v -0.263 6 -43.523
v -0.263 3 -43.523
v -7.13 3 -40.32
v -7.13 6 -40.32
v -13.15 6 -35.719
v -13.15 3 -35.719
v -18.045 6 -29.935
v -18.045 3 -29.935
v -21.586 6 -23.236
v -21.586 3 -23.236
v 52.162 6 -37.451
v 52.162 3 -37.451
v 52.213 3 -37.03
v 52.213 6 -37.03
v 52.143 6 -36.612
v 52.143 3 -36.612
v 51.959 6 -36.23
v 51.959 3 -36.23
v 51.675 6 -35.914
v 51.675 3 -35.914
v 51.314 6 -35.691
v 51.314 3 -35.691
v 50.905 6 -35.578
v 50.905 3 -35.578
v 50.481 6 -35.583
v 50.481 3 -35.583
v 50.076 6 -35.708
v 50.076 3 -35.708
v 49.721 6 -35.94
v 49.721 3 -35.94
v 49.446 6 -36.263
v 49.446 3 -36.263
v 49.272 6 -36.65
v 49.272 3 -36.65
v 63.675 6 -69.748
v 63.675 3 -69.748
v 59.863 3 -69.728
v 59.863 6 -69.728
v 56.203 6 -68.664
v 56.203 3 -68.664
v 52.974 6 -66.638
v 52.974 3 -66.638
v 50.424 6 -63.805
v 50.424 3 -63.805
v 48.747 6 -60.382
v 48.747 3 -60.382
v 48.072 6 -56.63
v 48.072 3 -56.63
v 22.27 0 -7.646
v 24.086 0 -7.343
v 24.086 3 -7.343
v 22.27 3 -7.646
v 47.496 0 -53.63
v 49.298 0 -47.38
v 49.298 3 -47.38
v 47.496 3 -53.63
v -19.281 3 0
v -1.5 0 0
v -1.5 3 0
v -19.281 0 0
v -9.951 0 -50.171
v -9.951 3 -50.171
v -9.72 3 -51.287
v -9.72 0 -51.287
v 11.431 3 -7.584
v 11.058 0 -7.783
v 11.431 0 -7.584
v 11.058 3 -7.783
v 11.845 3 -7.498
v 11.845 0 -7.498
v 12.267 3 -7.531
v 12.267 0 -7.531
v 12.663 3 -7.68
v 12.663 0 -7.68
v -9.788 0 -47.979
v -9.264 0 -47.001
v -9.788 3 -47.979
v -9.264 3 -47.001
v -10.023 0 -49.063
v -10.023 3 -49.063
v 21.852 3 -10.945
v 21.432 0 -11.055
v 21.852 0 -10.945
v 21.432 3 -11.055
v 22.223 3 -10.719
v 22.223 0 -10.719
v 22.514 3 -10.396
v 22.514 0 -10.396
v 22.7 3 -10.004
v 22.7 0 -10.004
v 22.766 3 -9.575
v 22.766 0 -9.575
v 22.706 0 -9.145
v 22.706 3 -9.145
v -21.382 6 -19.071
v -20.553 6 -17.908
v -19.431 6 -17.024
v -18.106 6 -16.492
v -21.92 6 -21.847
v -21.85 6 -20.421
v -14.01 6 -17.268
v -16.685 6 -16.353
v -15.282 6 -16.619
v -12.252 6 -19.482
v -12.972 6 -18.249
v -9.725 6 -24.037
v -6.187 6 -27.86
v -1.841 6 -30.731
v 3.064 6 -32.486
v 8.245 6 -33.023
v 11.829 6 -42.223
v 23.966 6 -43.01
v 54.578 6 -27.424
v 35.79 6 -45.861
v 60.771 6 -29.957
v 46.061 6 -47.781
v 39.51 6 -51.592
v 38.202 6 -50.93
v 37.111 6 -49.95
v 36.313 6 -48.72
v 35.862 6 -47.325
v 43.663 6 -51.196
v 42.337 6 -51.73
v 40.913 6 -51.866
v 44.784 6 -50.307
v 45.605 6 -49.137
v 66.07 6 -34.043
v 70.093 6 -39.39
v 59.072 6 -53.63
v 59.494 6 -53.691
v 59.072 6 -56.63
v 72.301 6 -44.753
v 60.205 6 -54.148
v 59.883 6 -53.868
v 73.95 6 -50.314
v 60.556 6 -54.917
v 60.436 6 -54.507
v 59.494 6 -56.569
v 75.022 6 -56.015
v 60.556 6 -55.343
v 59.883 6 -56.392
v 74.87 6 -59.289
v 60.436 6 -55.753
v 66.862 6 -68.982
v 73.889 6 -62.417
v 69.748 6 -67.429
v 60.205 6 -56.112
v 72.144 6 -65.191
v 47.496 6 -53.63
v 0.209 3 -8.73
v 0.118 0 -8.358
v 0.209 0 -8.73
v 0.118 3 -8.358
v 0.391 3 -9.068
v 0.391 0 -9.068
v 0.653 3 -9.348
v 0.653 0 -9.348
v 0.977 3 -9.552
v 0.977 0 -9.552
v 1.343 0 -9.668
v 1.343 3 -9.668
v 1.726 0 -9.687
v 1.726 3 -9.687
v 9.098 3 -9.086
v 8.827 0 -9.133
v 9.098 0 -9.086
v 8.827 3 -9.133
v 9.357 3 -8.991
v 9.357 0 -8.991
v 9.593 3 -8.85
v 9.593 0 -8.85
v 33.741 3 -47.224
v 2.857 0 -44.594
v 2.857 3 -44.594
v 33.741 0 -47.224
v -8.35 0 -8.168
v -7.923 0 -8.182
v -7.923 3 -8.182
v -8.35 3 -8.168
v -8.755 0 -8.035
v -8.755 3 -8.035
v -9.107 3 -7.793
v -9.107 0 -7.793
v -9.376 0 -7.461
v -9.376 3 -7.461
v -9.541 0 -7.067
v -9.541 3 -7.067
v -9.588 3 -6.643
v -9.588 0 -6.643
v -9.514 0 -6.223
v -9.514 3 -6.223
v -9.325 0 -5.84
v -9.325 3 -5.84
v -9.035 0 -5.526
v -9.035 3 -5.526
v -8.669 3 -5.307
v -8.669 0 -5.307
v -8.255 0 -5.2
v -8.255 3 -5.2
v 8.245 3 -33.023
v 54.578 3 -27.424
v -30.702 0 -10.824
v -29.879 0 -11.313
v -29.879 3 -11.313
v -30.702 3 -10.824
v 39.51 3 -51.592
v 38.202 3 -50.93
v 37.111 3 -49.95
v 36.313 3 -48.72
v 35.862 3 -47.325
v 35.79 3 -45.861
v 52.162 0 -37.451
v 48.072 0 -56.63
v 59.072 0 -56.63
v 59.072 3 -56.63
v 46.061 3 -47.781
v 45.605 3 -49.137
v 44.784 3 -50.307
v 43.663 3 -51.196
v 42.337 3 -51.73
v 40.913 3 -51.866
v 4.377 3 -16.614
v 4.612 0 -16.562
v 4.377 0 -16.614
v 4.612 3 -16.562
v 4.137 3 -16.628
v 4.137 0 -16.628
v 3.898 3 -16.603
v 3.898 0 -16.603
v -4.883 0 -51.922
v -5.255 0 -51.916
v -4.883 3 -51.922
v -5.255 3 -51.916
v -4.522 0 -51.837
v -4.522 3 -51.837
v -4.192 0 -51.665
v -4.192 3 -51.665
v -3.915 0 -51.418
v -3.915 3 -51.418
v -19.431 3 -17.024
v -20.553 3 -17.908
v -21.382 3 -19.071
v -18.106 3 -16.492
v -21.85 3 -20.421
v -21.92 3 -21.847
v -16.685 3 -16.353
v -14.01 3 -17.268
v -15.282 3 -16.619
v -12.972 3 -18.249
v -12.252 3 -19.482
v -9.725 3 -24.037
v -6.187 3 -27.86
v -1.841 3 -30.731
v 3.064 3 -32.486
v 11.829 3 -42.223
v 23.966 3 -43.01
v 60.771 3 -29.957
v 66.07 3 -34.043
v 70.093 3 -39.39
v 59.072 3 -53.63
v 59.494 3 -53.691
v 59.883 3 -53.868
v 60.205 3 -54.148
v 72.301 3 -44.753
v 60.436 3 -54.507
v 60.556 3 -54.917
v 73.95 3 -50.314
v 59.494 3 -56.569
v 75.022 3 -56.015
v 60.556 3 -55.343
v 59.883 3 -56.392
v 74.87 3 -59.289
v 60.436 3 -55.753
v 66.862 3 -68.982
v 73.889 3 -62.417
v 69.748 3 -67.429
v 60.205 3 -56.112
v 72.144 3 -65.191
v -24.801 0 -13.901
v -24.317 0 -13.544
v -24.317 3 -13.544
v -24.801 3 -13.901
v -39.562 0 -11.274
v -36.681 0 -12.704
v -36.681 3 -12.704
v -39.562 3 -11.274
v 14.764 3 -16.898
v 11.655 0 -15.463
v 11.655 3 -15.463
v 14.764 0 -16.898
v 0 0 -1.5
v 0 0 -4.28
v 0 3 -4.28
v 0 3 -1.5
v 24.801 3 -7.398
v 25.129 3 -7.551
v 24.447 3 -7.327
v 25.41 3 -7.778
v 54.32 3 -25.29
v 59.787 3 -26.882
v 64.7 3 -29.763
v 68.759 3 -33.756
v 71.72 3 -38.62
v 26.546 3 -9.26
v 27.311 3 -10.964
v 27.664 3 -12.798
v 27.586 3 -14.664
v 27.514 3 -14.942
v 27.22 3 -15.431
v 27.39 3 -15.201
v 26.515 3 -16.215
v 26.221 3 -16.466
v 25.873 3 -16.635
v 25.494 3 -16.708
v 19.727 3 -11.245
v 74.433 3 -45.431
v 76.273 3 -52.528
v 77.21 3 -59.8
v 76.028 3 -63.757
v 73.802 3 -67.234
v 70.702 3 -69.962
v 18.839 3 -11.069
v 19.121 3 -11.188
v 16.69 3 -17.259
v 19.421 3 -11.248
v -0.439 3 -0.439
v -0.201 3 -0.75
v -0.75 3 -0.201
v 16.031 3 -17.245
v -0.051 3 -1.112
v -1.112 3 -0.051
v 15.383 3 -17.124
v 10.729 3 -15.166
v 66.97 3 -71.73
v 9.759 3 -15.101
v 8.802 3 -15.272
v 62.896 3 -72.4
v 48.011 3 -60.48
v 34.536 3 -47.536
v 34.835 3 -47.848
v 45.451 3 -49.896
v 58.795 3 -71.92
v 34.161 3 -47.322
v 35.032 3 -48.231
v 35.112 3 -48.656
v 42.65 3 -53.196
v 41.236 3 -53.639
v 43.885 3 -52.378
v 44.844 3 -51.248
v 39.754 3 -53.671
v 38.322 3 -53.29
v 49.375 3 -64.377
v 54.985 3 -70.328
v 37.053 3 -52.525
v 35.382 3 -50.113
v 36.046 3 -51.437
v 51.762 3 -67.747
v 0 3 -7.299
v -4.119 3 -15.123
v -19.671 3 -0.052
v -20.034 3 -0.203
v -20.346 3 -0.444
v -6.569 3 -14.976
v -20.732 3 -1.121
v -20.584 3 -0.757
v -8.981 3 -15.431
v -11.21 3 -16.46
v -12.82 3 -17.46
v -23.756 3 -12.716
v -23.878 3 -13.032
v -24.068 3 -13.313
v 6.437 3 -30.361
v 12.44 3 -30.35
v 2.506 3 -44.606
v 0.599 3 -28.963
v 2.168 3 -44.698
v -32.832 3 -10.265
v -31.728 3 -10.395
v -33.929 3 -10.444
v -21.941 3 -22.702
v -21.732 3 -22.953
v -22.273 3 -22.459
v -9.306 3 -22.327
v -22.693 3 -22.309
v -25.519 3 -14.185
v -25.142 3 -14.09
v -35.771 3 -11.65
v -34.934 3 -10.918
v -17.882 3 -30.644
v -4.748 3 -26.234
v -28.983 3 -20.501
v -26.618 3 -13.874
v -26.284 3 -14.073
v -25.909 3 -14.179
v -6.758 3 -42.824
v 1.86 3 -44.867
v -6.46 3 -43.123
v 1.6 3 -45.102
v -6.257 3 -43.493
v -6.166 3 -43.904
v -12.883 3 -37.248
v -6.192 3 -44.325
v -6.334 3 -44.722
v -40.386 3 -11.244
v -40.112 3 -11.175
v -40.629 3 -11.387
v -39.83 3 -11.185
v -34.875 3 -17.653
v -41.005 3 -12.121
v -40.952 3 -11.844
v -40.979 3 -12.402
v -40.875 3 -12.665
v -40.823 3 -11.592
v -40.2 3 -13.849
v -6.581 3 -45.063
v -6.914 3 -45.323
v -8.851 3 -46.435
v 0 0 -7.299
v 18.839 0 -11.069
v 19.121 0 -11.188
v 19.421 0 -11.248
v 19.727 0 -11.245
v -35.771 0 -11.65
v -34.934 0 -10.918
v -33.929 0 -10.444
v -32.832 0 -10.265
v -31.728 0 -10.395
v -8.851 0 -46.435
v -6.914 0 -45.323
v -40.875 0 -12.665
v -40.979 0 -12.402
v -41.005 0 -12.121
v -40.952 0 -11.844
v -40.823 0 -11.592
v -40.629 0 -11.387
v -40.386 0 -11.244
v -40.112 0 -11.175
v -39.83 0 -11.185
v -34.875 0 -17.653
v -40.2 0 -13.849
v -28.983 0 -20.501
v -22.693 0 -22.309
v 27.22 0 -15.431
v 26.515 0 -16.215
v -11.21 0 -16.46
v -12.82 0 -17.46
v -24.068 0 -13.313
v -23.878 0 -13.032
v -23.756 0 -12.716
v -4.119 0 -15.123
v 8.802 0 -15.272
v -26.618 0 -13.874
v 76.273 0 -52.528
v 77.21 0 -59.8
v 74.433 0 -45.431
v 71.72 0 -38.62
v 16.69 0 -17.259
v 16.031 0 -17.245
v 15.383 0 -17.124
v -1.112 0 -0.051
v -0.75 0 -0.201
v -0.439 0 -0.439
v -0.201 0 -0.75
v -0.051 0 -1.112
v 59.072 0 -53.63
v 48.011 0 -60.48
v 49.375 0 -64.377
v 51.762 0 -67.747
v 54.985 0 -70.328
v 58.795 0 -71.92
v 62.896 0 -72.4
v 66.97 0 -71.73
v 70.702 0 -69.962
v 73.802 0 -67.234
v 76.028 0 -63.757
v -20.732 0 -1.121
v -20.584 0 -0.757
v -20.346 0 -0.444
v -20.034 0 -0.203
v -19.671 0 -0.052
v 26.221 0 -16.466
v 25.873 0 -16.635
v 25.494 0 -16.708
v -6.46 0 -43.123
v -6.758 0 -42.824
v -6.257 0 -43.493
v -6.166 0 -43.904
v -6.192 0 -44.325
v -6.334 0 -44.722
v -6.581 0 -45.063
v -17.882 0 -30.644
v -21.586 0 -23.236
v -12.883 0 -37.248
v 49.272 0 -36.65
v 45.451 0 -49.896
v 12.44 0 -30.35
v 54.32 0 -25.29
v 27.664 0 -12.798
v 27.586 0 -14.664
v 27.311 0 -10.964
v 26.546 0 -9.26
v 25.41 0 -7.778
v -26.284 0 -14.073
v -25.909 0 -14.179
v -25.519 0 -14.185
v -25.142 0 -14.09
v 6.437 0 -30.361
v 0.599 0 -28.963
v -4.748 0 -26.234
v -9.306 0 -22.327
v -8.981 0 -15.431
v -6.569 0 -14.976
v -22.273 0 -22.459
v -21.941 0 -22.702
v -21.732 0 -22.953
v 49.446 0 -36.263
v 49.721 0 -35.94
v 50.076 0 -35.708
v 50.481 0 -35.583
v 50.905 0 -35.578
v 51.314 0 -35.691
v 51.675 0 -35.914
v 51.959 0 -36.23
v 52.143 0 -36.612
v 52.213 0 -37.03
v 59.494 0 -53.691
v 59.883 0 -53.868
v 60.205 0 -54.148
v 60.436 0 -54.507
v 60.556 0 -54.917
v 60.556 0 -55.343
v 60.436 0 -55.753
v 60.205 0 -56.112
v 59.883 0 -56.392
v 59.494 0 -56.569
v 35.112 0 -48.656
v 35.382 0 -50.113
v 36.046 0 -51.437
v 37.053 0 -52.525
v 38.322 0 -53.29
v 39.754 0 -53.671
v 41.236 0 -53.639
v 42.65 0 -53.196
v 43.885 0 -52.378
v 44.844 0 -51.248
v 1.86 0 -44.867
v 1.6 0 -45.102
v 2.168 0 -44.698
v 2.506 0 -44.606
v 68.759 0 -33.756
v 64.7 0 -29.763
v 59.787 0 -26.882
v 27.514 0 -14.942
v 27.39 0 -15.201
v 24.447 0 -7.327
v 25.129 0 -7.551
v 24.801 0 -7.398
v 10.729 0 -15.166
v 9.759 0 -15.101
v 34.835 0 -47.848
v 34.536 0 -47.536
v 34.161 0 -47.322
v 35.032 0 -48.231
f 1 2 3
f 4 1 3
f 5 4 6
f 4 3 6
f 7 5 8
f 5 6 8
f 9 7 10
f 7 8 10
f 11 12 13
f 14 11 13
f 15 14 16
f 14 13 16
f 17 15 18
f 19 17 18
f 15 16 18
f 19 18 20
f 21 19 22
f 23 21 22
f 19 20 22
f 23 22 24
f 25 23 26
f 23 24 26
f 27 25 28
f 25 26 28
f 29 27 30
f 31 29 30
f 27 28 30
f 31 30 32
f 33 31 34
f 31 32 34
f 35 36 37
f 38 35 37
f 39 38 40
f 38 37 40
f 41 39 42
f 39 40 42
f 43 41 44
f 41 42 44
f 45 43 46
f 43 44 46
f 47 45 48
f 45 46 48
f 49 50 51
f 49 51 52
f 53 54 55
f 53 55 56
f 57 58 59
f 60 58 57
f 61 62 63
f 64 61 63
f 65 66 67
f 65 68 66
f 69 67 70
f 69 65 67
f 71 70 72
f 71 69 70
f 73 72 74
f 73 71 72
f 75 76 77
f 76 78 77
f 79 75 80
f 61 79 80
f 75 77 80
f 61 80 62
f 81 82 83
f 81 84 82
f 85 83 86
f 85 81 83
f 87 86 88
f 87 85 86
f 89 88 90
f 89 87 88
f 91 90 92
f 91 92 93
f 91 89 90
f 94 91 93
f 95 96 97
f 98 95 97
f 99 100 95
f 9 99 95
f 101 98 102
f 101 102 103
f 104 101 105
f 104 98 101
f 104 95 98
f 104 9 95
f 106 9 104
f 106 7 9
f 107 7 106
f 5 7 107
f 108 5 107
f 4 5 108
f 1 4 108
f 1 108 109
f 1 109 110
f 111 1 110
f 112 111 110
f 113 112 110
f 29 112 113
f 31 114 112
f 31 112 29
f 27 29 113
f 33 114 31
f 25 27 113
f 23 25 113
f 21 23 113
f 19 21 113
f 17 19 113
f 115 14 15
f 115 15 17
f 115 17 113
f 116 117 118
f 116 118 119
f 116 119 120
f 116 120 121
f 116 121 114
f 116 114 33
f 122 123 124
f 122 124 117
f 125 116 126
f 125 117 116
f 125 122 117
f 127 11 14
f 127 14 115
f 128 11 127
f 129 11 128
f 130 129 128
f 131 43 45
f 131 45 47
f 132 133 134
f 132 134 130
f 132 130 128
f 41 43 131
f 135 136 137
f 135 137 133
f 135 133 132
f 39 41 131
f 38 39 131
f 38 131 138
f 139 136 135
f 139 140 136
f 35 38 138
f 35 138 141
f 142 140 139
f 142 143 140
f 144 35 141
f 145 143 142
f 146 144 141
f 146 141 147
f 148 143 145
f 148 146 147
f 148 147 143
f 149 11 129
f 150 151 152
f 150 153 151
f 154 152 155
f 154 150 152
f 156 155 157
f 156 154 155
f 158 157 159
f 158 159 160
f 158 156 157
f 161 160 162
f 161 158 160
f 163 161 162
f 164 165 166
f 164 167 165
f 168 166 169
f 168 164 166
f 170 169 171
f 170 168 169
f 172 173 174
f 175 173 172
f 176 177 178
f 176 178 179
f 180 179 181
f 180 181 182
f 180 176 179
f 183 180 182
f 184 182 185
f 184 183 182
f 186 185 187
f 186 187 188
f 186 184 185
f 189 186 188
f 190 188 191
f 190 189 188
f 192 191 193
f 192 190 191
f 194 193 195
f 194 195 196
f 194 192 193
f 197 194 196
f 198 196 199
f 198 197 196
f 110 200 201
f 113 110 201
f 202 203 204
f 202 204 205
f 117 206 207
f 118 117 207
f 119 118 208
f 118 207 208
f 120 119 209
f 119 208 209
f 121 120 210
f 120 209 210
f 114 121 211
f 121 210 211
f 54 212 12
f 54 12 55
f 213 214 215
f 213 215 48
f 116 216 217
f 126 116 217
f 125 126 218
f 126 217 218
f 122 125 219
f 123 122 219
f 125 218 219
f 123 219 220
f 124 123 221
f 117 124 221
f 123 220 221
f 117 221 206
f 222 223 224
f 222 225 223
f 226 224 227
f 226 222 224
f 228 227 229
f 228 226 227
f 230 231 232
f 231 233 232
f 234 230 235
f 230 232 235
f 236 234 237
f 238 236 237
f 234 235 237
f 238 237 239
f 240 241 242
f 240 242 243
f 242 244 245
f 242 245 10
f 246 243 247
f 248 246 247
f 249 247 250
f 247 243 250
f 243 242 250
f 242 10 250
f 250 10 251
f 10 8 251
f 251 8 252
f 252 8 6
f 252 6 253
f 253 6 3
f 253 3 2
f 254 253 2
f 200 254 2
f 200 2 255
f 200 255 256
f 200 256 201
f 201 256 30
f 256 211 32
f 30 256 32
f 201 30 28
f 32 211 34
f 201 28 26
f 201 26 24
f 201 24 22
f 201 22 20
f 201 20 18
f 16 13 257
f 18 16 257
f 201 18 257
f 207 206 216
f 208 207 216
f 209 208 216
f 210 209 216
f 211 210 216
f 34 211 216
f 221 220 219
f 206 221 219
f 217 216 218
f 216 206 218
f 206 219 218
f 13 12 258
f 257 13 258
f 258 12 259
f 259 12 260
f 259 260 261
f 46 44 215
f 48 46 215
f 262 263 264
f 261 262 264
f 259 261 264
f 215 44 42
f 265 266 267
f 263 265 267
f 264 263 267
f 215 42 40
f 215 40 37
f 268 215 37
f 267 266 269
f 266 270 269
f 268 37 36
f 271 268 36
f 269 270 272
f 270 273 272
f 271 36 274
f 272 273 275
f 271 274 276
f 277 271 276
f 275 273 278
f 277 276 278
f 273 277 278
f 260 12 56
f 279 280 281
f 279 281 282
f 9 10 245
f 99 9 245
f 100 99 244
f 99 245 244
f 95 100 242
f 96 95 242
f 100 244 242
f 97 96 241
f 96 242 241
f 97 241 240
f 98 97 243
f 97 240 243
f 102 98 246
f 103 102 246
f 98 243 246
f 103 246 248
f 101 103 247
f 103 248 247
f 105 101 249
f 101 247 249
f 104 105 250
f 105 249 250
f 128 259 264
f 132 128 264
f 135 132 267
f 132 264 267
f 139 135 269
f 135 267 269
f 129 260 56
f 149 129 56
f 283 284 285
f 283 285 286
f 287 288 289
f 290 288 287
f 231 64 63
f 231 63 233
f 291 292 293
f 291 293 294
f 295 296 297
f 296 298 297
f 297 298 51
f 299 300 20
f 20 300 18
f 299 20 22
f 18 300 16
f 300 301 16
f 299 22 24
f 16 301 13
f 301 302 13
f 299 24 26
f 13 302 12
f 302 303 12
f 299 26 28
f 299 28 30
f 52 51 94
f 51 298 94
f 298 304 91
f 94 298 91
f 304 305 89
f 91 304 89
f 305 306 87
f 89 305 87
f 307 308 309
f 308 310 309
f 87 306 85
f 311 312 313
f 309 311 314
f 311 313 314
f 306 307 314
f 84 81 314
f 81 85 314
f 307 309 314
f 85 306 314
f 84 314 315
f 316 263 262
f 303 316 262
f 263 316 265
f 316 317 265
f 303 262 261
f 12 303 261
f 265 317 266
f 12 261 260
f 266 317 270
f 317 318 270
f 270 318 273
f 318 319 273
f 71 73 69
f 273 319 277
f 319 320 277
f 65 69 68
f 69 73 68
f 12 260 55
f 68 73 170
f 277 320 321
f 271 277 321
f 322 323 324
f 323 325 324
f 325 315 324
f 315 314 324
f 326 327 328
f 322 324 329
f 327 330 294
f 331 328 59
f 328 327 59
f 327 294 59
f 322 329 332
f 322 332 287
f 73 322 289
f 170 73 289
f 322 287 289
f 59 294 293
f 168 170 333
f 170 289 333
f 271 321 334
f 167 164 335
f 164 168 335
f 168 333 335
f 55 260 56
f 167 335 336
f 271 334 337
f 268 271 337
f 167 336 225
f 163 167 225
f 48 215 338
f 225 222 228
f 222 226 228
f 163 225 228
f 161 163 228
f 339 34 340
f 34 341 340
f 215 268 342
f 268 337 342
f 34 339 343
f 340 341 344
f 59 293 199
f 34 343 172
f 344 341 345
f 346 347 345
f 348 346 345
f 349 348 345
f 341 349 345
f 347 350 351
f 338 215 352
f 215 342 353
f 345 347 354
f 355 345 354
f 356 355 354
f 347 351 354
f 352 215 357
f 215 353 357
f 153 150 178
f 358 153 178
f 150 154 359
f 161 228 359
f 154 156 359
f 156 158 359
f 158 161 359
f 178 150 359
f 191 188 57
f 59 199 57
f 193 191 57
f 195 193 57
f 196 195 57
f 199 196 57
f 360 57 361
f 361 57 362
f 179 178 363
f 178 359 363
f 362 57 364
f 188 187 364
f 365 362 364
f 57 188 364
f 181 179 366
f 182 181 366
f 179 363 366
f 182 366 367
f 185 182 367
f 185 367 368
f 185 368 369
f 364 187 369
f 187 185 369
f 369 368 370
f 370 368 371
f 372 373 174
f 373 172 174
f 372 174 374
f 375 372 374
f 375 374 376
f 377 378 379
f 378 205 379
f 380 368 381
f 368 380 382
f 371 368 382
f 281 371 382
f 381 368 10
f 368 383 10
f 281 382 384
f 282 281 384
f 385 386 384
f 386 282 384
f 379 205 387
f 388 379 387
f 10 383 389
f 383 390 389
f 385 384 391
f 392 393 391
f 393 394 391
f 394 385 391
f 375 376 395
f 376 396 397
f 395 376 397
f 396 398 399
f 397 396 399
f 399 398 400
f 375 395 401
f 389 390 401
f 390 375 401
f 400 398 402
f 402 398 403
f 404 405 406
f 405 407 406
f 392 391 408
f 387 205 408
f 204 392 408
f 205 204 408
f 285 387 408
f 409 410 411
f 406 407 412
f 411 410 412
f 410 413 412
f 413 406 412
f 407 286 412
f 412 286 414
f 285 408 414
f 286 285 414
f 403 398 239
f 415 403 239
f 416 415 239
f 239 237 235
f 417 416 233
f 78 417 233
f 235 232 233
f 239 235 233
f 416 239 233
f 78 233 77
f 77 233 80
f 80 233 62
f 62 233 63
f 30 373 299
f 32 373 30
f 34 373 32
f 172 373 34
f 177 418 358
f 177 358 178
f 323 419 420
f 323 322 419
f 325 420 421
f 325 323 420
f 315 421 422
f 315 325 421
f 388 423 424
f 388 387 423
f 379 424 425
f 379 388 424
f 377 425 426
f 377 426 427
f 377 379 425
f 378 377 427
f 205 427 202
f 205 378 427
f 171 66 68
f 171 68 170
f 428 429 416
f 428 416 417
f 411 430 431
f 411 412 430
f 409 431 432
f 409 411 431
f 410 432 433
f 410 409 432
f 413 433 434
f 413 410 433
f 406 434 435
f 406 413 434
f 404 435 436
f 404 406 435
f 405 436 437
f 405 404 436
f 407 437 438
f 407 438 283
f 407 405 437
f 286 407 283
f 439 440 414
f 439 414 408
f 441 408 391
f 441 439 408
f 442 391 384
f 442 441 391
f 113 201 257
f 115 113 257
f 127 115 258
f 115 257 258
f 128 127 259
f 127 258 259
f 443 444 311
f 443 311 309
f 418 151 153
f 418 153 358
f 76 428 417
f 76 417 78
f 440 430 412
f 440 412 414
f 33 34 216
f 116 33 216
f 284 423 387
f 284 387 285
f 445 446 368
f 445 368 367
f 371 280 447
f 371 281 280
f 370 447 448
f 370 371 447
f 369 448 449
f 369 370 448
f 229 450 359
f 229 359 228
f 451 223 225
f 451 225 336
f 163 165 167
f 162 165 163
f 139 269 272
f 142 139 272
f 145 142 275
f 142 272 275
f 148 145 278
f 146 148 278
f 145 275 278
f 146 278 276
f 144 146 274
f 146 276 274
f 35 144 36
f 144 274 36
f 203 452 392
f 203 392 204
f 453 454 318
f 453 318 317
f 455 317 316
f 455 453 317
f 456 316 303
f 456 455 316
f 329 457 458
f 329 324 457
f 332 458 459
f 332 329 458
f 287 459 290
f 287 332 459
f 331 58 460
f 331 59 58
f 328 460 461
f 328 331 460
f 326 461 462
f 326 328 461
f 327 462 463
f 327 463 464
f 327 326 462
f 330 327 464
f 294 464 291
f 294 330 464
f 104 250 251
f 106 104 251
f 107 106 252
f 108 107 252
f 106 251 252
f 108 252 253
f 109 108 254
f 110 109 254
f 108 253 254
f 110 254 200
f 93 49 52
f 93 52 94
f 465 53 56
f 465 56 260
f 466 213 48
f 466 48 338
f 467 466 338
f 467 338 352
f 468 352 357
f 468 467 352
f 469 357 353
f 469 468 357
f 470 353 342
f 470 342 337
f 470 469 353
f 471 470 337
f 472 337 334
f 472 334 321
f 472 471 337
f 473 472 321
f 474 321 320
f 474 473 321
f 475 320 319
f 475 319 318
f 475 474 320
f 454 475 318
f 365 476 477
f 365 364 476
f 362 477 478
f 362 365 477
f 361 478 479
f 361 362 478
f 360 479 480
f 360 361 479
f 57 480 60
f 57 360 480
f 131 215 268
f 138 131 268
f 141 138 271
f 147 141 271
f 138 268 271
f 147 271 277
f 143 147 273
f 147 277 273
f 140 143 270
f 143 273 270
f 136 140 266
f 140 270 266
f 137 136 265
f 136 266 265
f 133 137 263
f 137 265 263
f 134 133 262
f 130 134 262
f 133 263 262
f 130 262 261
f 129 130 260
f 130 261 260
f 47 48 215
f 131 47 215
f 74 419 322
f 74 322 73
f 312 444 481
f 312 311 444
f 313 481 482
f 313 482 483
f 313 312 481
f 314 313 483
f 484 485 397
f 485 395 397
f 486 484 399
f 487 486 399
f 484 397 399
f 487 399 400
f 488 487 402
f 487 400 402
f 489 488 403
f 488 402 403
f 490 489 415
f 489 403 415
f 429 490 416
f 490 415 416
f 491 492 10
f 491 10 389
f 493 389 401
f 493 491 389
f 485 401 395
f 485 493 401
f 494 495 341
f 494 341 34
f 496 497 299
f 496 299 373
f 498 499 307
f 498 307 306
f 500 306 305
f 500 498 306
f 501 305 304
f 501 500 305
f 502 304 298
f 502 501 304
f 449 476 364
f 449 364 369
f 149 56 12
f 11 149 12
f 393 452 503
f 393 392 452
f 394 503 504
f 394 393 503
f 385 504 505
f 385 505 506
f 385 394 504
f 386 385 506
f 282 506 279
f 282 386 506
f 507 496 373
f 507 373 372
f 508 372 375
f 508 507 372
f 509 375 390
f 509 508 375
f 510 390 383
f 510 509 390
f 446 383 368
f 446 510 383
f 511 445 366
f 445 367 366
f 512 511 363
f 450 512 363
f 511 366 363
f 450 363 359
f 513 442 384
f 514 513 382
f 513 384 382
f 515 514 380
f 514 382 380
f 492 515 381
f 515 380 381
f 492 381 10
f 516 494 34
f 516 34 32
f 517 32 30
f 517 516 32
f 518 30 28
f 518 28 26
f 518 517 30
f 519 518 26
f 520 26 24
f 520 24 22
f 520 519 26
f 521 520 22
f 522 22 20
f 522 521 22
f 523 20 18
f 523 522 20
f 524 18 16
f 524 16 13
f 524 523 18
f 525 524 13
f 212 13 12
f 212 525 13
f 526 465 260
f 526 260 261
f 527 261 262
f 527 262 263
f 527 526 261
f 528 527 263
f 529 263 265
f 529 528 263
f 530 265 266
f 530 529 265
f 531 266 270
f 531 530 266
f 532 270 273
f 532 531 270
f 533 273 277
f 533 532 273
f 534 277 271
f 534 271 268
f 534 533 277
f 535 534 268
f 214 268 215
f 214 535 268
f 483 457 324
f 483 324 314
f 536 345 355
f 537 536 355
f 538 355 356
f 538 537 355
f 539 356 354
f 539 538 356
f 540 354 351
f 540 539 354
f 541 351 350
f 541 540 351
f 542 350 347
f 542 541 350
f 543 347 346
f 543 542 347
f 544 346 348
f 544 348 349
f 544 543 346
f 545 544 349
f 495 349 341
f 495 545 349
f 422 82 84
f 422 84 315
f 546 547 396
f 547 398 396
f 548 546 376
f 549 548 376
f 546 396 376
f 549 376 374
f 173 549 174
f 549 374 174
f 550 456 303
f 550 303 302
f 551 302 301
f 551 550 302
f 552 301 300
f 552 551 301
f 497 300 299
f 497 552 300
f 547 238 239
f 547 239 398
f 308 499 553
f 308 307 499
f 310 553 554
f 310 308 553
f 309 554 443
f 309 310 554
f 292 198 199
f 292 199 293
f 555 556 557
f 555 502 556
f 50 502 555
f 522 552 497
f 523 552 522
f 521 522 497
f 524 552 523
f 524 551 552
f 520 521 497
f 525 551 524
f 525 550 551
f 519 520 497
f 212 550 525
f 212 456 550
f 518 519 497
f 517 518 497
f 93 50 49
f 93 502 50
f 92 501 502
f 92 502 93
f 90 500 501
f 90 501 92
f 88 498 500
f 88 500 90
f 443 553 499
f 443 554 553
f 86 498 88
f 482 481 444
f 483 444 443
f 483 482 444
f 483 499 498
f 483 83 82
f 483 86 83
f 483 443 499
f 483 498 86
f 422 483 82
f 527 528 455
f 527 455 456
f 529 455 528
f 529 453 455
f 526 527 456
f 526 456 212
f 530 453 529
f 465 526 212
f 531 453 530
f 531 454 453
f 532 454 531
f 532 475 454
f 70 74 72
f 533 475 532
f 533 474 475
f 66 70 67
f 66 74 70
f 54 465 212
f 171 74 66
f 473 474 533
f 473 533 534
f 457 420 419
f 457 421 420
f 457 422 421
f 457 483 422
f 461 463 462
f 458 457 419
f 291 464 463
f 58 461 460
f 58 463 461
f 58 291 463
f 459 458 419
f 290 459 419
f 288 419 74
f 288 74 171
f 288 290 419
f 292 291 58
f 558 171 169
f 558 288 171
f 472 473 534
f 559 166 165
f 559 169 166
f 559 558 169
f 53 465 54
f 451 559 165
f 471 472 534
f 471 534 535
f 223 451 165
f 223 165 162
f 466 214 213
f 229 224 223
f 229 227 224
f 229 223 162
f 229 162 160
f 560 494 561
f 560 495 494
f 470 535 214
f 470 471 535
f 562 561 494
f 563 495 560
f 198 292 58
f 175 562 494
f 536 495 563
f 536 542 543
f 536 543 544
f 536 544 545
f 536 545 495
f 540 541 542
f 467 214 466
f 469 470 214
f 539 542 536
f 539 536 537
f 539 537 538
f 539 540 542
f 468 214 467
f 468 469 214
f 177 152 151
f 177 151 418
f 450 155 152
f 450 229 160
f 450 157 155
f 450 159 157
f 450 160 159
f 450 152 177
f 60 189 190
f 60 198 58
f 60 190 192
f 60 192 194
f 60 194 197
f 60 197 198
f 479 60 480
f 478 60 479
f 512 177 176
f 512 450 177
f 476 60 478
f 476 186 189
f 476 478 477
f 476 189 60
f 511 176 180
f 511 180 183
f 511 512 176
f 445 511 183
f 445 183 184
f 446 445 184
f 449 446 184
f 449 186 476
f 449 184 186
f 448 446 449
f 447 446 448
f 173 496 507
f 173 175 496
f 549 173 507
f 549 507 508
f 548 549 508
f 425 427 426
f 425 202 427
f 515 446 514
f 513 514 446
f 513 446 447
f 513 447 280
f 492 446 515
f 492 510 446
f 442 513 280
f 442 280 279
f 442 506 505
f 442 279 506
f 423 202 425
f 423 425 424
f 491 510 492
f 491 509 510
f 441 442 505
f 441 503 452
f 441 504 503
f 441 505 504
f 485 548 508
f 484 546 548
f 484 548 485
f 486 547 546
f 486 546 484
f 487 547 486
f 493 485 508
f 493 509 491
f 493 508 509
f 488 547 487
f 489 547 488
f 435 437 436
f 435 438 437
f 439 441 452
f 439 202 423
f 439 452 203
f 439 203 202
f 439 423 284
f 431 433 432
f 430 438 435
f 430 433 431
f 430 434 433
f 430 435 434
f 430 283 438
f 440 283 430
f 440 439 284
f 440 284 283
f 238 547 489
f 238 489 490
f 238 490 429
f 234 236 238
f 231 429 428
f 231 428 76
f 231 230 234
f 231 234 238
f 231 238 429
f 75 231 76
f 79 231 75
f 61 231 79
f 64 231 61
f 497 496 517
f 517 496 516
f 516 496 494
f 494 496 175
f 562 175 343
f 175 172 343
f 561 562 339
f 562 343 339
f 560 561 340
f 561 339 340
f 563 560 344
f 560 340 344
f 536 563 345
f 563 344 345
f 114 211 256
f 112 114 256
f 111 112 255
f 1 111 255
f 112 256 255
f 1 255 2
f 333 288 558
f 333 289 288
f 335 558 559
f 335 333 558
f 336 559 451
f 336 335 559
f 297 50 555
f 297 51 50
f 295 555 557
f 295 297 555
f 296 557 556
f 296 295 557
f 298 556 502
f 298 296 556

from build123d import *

# Parameters (mm, degrees)
BOSS_EXTRUDE1_DEPTH = 3
FILLET1_R           = 10
FILLET2_R           = 1
FILLET3_R           = 1.5
FILLET4_R           = 4
FILLET5_R           = 4
BOSS_EXTRUDE2_DEPTH = 3


with BuildPart() as part:
    # Sketch2 → Boss-Extrude1 (new body)
    with BuildSketch(Plane(origin=(0, 0, 0), x_dir=(1, 0, 0), z_dir=(0, 1, 0))):
        with BuildLine():
            Line((-42.5, 9.815250458), (-40.2, 13.848552856))
            ThreePointArc((-40.2, 13.848552856), (-31.616402931, 19.380516515), (-21.88, 22.46))
            ThreePointArc((-21.88, 22.46), (-15.087159026, 34.642704233), (-4.89, 44.16))
            Line((-4.89, 44.16), (-8.851038754, 46.435359195))
            Line((-8.851038754, 46.435359195), (-10.31, 48.433697347))
            Line((-10.31, 48.433697347), (-9.719569356, 51.28656851))
            Line((-9.719569356, 51.28656851), (-4.45, 52.03))
            Line((-4.45, 52.03), (2.1, 44.53))
            Line((2.1, 44.53), (35.22, 47.35))
            ThreePointArc((35.22, 47.35), (39.1087714, 53.552611798), (45.450837647, 49.895682508))
            Line((45.450837647, 49.895682508), (49.271682555, 36.649721013))
            ThreePointArc((49.271682555, 36.649721013), (51.113757972, 35.62), (52.162431436, 37.451352279))
            Line((52.162431436, 37.451352279), (49.298477535, 47.38))
            Line((49.298477535, 47.38), (47.49564271, 53.63))
            Line((47.49564271, 53.63), (59.07164271, 53.63))
            ThreePointArc((59.07164271, 53.63), (60.57164271, 55.13), (59.07164271, 56.63))
            Line((59.07164271, 56.63), (48.07164271, 56.63))
            Line((48.07164271, 56.63), (48.010812194, 60.48))
            ThreePointArc((48.010812194, 60.48), (62.895920888, 72.4), (77.21, 59.8))
            ThreePointArc((77.21, 59.8), (75.464062366, 48.951036242), (71.72, 38.62))
            ThreePointArc((71.72, 38.62), (64.699564013, 29.762620869), (54.32, 25.29))
            Line((54.32, 25.29), (12.44, 30.35))
            ThreePointArc((12.44, 30.35), (-2.155765073, 27.757228529), (-12.82, 17.46))
            Line((-12.82, 17.46), (-7.923093172, 14.42))
            Line((-7.923093172, 14.42), (4.26, 16.67))
            Line((4.26, 16.67), (10.264967392, 14.82186735))
            Line((10.264967392, 14.82186735), (15.68118928, 17.321714129))
            Line((15.68118928, 17.321714129), (26.105067381, 16.67))
            Line((26.105067381, 16.67), (27.5, 15.12))
            ThreePointArc((27.5, 15.12), (27.256062178, 10.796585791), (24.812537217, 7.22158903))
            Line((24.812537217, 7.22158903), (22.269740859, 7.646334739))
            Line((22.269740859, 7.646334739), (23.205269456, 10.857431213))
            Line((23.205269456, 10.857431213), (19.255161489, 11.297641869))
            Line((19.255161489, 11.297641869), (11.827625236, 7.22158903))
            Line((11.827625236, 7.22158903), (9.25, 9.1))
            Line((9.25, 9.1), (0.278765895, 9.8))
            Line((0.278765895, 9.8), (0, 7.298571725))
            Line((0, 7.298571725), (-7.923093172, 8.181542538))
            ThreePointArc((-7.923093172, 8.181542538), (-9.58, 6.856906829), (-8.255364291, 5.2))
            Line((-8.255364291, 5.2), (0, 4.28))
            Line((0, 4.28), (0, 0))
            Line((0, 0), (-20.44, 0))
            Line((-20.44, 0), (-23.89, 13.229016126))
            Line((-23.89, 13.229016126), (-25.72, 14.58))
            Line((-25.72, 14.58), (-29.87882635, 11.312892327))
            Line((-29.87882635, 11.312892327), (-33.582044966, 9.115250458))
            Line((-33.582044966, 9.115250458), (-36.680656461, 12.703691255))
            Line((-36.680656461, 12.703691255), (-42.5, 9.815250458))
        make_face()
    extrude(amount=BOSS_EXTRUDE1_DEPTH)

    # Fillet1
    fillet1_edges = [part.edges().sort_by_distance(p)[0] for p in [
        (-7.923093172, 1.5, -14.42),
    ]]
    fillet(fillet1_edges, radius=FILLET1_R)

    # Fillet2
    fillet2_edges = [part.edges().sort_by_distance(p)[0] for p in [
        (-42.5, 1.5, -9.815250458),
    ]]
    fillet(fillet2_edges, radius=FILLET2_R)

    # Fillet3
    fillet3_edges = [part.edges().sort_by_distance(p)[0] for p in [
        (4.26, 1.5, -16.67),
        (26.105067381, 1.5, -16.67),
        (27.5, 1.5, -15.12),
        (24.812537217, 1.5, -7.22158903),
        (23.205269456, 1.5, -10.857431213),
        (19.255161489, 1.5, -11.297641869),
        (11.827625236, 1.5, -7.22158903),
        (9.25, 1.5, -9.1),
        (0.278765895, 1.5, -9.8),
        (0, 1.5, 0),
        (-20.44, 1.5, 0),
        (-23.89, 1.5, -13.229016126),
        (-25.72, 1.5, -14.58),
        (-21.88, 1.5, -22.46),
        (-4.89, 1.5, -44.16),
        (-4.45, 1.5, -52.03),
        (2.1, 1.5, -44.53),
        (35.22, 1.5, -47.35),
    ]]
    fillet(fillet3_edges, radius=FILLET3_R)

    # Fillet4
    fillet4_edges = [part.edges().sort_by_distance(p)[0] for p in [
        (-33.582044966, 1.5, -9.115250458),
        (-10.31, 1.5, -48.433697347),
    ]]
    fillet(fillet4_edges, radius=FILLET4_R)

    # Fillet5
    fillet5_edges = [part.edges().sort_by_distance(p)[0] for p in [
        (10.264967392, 1.5, -14.82186735),
        (15.68118928, 1.5, -17.321714129),
    ]]
    fillet(fillet5_edges, radius=FILLET5_R)


with BuildPart() as body_2:
    # Sketch3 → Boss-Extrude2 (new body)
    with BuildSketch(Plane(origin=(0, 3, 0), x_dir=(1, 0, 0), z_dir=(0, 1, 0))):
        with BuildLine():
            Line((47.49564271, 53.63), (52.162431436, 37.451352279))
            ThreePointArc((52.162431436, 37.451352279), (51.113757972, 35.62), (49.271682555, 36.649721013))
            Line((49.271682555, 36.649721013), (46.060753469, 47.781249263))
            ThreePointArc((46.060753469, 47.781249263), (43.663324393, 51.196046687), (39.509770815, 51.591647872))
            ThreePointArc((39.509770815, 51.591647872), (36.671412252, 49.361522696), (35.789887525, 45.861143889))
            ThreePointArc((35.789887525, 45.861143889), (17.914819637, 42.355240721), (-0.263335901, 43.523174907))
            ThreePointArc((-0.263335901, 43.523174907), (-13.150433821, 35.718829472), (-21.585997074, 23.235786051))
            ThreePointArc((-21.585997074, 23.235786051), (-18.787922166, 16.710792033), (-12.251673396, 19.482474221))
            ThreePointArc((-12.251673396, 19.482474221), (-4.100058768, 29.426278917), (8.244786893, 33.022507287))
            Line((8.244786893, 33.022507287), (54.5778905, 27.4244771))
            ThreePointArc((54.5778905, 27.4244771), (63.558088847, 31.821488993), (70.092790044, 39.389537367))
            ThreePointArc((70.092790044, 39.389537367), (73.196650491, 47.512542622), (75.021833478, 56.014652425))
            ThreePointArc((75.021833478, 56.014652425), (72.143647203, 65.190990417), (63.674821624, 69.748196631))
            ThreePointArc((63.674821624, 69.748196631), (52.973928794, 66.637617234), (48.07164271, 56.63))
            Line((48.07164271, 56.63), (59.07164271, 56.63))
            ThreePointArc((59.07164271, 56.63), (60.57164271, 55.13), (59.07164271, 53.63))
            Line((59.07164271, 53.63), (47.49564271, 53.63))
        make_face()
    extrude(amount=BOSS_EXTRUDE2_DEPTH)


solid = Compound([part.part, body_2.part])
